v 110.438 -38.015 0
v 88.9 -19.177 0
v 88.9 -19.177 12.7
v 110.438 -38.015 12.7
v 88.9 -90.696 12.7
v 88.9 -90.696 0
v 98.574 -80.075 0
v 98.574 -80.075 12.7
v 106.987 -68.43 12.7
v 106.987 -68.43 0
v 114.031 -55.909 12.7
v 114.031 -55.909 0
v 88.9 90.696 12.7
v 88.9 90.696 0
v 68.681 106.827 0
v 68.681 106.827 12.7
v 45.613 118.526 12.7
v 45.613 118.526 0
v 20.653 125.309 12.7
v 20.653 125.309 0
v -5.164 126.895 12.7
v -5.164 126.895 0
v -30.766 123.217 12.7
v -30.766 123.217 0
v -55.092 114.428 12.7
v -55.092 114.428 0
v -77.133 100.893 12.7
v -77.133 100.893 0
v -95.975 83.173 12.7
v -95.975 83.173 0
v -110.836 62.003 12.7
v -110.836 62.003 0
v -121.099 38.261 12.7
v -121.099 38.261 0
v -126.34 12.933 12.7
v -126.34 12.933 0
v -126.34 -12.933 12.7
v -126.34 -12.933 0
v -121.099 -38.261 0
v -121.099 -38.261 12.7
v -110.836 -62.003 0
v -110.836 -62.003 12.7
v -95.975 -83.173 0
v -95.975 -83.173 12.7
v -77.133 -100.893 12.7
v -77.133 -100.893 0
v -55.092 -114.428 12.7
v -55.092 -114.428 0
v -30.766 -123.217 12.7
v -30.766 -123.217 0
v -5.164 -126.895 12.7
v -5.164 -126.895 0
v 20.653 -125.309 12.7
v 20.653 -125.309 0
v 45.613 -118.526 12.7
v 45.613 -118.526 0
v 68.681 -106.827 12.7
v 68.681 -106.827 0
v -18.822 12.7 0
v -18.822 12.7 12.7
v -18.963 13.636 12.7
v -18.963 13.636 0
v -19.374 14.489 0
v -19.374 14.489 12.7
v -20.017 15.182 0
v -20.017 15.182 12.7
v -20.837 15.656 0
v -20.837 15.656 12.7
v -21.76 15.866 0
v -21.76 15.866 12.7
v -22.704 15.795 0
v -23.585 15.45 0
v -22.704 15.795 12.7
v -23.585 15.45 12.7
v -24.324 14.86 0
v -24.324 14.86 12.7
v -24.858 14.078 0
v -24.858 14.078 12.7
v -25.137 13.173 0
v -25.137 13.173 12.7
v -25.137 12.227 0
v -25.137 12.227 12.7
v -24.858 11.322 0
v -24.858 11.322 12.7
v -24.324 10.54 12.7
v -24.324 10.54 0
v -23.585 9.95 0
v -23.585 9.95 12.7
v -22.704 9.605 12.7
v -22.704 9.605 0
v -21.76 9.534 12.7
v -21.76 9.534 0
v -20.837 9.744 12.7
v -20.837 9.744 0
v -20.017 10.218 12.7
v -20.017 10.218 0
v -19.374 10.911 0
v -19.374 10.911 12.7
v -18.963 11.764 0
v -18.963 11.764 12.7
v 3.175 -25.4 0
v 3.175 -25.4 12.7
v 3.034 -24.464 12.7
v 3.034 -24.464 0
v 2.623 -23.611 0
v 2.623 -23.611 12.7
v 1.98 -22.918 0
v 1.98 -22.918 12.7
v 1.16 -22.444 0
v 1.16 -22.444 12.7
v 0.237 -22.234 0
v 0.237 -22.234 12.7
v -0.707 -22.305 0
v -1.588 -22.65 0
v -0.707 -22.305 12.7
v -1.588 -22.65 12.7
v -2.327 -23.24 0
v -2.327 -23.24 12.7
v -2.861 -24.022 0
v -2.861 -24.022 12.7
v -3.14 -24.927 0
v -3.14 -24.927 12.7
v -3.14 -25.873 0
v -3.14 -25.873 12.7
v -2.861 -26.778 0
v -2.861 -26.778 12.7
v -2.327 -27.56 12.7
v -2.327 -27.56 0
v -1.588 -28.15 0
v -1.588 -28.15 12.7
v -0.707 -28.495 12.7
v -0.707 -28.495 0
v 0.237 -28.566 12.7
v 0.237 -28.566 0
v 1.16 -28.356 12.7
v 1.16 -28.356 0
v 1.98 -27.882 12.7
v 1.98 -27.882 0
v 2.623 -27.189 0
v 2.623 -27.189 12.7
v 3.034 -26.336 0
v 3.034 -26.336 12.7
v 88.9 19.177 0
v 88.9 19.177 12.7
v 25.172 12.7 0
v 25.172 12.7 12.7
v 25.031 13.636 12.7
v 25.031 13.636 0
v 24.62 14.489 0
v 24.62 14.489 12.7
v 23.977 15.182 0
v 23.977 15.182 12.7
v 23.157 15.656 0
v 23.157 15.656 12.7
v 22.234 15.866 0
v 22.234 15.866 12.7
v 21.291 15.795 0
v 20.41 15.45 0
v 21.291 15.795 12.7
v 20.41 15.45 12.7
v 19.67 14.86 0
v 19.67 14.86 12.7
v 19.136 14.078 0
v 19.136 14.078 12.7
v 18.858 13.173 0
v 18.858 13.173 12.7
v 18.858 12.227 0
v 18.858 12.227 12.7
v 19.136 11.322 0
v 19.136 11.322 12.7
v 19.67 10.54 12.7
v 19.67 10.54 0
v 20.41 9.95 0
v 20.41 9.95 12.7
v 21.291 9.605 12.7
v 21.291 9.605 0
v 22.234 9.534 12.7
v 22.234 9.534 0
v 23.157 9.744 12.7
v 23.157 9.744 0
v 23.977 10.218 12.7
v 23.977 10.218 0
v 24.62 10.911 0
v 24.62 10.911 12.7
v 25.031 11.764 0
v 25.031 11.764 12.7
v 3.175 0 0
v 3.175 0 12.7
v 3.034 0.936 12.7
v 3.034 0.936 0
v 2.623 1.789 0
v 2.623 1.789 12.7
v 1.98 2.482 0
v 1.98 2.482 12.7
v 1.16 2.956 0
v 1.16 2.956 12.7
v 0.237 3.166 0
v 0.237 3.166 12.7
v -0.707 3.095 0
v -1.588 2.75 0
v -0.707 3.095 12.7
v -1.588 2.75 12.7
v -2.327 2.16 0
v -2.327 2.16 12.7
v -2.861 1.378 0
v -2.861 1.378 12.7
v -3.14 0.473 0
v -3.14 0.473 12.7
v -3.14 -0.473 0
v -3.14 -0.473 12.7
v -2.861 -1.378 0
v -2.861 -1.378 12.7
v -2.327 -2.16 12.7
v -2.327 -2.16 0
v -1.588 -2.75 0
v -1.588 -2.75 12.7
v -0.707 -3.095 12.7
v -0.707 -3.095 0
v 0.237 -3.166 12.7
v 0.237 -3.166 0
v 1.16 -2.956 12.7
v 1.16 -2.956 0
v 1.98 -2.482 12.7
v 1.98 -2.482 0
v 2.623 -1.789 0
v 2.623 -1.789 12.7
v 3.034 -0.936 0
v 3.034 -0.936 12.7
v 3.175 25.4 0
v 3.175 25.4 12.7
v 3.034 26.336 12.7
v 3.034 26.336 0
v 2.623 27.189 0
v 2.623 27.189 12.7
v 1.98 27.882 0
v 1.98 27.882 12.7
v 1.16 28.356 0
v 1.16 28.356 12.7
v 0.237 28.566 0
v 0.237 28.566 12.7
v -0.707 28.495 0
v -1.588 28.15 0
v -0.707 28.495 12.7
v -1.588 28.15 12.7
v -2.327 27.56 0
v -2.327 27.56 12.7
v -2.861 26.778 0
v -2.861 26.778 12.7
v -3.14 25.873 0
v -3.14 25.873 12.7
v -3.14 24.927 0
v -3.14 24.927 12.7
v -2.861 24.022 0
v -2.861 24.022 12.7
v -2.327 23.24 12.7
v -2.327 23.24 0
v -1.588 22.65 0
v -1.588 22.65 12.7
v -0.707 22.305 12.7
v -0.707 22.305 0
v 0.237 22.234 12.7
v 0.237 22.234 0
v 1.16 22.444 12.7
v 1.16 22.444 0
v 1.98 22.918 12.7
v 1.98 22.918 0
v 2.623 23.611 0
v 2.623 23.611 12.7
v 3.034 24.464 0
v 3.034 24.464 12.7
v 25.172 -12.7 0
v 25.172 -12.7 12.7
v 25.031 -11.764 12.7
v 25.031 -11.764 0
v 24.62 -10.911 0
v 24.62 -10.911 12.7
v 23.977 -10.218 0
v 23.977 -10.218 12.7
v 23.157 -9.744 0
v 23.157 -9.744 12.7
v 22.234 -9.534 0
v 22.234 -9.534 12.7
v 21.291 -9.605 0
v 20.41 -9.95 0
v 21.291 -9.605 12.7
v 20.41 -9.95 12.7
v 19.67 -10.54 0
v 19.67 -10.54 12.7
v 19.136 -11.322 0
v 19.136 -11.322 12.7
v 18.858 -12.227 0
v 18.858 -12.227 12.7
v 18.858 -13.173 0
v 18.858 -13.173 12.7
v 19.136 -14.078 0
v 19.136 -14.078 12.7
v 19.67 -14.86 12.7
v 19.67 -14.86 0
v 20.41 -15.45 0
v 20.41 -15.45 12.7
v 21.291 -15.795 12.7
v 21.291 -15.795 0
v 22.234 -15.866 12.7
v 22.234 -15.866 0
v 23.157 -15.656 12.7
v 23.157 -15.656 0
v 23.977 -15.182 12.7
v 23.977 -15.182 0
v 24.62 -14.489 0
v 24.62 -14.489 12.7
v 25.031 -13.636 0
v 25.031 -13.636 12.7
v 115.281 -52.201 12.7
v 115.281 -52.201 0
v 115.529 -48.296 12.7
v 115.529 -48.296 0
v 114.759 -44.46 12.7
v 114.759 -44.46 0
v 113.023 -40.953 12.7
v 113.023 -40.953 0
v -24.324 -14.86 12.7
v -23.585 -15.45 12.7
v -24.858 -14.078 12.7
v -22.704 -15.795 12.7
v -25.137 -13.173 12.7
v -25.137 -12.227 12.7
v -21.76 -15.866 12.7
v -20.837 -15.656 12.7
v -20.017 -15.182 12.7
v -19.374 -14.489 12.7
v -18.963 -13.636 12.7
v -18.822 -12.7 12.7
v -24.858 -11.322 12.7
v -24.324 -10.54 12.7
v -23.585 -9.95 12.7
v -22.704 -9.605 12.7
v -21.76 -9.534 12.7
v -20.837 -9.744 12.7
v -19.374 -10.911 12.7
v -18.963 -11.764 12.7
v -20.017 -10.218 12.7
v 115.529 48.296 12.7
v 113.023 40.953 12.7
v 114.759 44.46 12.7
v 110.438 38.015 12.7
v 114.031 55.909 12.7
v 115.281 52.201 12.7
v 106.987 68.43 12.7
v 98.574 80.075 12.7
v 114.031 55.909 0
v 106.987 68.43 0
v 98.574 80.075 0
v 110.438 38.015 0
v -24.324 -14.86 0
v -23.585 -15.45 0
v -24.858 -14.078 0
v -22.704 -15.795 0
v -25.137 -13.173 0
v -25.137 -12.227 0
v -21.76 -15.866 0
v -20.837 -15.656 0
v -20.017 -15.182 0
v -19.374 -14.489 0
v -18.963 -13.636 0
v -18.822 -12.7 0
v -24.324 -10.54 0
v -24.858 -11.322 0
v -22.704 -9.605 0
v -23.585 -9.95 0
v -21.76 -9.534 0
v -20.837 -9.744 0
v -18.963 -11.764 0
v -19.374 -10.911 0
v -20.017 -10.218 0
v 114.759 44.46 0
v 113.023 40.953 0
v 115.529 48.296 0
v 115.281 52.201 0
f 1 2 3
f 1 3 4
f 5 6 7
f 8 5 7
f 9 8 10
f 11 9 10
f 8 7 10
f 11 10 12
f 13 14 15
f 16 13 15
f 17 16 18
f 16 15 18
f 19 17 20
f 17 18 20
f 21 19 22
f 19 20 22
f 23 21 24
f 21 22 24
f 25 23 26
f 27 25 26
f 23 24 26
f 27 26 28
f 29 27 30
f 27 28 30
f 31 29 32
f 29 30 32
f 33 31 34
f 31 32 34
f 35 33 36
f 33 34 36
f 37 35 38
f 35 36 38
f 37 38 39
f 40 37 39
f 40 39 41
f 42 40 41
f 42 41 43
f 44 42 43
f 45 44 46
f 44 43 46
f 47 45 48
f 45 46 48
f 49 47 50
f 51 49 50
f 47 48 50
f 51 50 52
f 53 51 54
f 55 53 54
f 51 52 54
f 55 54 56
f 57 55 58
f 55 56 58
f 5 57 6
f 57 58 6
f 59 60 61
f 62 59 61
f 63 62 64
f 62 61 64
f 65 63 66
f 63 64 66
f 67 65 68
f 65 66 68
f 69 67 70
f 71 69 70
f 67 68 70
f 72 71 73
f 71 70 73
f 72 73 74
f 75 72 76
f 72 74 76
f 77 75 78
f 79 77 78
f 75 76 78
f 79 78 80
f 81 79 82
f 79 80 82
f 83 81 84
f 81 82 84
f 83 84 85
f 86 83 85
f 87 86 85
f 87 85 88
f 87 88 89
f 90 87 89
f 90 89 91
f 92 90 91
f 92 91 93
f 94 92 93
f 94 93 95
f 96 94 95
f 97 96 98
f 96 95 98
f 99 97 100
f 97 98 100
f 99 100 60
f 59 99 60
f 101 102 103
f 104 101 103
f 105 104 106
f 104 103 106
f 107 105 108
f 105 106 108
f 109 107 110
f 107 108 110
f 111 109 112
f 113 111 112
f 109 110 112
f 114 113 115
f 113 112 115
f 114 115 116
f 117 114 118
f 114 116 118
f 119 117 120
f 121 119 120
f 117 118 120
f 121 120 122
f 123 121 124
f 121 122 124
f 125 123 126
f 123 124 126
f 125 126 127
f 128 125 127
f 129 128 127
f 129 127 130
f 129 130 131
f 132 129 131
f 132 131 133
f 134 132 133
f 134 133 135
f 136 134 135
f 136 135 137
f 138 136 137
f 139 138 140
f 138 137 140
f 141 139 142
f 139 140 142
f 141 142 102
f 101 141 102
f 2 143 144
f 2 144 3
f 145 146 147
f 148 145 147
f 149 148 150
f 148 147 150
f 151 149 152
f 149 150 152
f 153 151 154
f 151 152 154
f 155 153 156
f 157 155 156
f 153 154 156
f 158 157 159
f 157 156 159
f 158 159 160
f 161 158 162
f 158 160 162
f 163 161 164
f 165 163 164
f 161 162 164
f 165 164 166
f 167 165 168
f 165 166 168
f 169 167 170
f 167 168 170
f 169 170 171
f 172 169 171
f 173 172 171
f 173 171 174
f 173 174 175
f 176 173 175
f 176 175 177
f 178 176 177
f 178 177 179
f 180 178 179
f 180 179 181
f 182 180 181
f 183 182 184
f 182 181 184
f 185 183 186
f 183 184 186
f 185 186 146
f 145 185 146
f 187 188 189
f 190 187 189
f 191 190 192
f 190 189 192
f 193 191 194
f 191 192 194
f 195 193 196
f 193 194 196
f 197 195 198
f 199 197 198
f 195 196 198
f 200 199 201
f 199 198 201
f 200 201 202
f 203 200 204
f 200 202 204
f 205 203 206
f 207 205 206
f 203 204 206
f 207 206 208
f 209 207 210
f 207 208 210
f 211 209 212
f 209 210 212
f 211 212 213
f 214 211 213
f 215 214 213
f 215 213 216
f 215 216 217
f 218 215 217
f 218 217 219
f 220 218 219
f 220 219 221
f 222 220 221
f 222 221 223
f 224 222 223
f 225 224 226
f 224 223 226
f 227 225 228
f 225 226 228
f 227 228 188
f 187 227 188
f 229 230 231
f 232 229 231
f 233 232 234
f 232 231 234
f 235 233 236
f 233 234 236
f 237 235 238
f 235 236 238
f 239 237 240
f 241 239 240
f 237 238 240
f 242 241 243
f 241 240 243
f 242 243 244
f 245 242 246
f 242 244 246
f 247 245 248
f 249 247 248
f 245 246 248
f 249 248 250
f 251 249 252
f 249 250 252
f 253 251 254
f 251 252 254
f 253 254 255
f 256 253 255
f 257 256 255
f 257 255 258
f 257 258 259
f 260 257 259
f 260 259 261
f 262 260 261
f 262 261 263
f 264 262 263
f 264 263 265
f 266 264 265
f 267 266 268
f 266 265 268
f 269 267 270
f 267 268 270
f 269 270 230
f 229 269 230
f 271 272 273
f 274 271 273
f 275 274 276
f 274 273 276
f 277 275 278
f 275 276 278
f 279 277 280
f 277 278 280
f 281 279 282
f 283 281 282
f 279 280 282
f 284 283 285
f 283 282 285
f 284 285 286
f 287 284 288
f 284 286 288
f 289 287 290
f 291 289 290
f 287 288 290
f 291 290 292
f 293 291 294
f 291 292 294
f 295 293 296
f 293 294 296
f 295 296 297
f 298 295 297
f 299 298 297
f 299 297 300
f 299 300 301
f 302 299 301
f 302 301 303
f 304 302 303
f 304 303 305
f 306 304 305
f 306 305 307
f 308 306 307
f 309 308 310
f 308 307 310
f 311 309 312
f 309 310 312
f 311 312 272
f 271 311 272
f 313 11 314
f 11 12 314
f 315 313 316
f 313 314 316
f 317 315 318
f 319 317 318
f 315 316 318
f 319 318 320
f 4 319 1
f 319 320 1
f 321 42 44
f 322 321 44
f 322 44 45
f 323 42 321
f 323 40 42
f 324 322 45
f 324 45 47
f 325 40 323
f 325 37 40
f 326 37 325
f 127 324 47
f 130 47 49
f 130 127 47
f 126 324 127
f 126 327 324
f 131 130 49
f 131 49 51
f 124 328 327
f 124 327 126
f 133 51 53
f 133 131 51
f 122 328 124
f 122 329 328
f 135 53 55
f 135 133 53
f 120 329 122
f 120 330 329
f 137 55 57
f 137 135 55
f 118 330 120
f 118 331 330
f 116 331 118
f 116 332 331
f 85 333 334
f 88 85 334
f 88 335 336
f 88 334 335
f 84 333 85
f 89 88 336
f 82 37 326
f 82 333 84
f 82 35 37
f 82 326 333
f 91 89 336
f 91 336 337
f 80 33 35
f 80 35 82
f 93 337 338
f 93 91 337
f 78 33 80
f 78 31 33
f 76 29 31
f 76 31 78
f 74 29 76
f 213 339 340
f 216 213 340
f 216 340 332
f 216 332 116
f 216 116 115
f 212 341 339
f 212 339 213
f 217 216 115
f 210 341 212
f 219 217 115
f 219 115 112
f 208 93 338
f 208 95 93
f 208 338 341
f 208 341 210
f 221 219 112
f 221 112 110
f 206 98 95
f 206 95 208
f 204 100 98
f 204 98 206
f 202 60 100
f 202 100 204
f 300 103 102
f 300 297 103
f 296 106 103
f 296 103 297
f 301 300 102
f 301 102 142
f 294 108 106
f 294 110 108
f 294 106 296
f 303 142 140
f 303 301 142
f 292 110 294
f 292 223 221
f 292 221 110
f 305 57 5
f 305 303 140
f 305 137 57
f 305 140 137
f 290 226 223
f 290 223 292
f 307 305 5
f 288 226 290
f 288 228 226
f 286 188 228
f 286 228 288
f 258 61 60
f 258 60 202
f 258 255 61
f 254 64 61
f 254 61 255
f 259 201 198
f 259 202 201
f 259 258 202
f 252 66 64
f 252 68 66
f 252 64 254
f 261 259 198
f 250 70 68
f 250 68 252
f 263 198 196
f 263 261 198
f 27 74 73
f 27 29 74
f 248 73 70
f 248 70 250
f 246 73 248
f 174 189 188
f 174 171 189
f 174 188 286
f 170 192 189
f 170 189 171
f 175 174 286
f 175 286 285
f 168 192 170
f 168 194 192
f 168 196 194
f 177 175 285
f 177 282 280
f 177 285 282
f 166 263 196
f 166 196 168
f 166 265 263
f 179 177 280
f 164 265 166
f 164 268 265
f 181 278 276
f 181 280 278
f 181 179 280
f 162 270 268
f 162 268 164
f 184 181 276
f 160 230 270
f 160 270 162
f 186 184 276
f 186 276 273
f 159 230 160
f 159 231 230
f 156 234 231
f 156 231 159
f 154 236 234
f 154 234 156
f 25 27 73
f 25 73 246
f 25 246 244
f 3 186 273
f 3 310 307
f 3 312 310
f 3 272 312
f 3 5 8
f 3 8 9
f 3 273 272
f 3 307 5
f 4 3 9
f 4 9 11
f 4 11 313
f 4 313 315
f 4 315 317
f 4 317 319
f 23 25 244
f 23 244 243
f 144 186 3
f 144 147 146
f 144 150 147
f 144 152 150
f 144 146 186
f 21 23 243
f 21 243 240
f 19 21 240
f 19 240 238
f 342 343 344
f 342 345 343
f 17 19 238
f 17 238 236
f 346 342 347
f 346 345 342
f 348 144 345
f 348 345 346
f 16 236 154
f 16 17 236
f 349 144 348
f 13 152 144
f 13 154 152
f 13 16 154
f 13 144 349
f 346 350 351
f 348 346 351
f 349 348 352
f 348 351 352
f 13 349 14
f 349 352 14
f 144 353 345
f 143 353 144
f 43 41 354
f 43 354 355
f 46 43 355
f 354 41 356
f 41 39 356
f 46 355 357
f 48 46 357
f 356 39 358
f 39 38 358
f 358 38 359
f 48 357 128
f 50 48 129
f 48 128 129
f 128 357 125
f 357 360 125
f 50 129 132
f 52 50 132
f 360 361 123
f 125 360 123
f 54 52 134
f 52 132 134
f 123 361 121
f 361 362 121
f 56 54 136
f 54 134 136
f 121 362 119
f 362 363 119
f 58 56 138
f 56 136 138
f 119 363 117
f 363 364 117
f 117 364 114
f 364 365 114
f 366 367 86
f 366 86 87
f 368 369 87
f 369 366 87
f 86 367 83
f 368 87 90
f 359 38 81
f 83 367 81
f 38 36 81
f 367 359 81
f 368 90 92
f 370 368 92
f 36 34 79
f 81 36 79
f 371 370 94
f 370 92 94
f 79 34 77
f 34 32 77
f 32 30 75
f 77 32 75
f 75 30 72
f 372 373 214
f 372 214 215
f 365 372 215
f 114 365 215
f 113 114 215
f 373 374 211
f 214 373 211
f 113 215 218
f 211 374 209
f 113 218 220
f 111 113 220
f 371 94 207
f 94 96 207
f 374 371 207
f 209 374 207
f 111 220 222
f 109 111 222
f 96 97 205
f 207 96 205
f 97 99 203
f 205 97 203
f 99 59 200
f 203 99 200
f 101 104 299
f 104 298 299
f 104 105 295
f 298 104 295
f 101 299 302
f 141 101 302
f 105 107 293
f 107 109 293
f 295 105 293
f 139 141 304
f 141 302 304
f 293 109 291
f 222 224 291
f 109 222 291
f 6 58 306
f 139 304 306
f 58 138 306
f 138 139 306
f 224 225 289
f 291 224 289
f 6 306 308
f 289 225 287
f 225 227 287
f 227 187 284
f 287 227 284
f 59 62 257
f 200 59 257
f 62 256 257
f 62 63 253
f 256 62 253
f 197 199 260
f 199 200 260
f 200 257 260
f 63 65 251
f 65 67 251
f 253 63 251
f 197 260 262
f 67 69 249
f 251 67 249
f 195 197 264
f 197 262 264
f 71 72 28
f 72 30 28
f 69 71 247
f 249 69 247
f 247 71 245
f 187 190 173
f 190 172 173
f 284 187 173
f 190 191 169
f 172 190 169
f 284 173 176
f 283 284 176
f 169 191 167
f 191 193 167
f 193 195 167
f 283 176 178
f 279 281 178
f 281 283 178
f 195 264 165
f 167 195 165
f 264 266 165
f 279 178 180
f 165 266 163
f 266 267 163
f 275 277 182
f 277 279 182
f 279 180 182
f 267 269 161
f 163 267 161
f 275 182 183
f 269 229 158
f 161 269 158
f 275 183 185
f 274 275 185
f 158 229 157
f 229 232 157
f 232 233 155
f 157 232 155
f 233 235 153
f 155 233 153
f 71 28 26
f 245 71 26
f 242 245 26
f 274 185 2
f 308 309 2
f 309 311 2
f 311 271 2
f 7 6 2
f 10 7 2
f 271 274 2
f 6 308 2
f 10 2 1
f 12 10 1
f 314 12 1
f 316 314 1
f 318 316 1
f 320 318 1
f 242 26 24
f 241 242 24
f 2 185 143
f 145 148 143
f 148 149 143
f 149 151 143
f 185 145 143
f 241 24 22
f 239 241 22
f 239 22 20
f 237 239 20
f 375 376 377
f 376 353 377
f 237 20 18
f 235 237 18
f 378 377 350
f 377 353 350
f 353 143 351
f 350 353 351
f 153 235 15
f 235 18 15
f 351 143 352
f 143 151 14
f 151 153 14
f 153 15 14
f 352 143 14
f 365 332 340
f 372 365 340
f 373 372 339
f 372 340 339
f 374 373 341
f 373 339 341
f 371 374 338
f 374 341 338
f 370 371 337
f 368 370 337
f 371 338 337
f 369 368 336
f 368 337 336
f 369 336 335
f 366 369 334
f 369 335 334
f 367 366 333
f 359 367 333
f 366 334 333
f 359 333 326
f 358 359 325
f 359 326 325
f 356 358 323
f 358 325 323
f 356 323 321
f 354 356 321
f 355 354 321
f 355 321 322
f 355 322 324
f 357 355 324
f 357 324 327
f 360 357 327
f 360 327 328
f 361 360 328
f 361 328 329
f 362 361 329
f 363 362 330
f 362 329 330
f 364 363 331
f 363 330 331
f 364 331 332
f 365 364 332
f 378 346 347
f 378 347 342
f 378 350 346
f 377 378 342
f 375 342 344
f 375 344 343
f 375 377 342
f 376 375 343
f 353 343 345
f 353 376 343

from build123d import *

# Parameters (mm, degrees)
F2_DEPTH = 12.7
F3_DEPTH = 12.7
F4_R     = 15
F5_R     = 3.175
F6_DEPTH = 12.7


with BuildPart() as f2:
    # F0 (on Top) → F2 (new body)
    with BuildSketch(Plane.XY):
        with BuildLine():
            Line((88.9, 0), (88.9, 90.6961410425))
            ThreePointArc((88.9, 90.6961410425), (-127, 0), (88.9, -90.6961410425))
            Line((88.9, -90.6961410425), (88.9, 0))
        make_face()
        with BuildLine():
            Line((88.9, 0), (127, 0))
            ThreePointArc((127, 0), (117.0882146076, 49.1868884968), (88.9, 90.6961410425))
            Line((88.9, 90.6961410425), (88.9, 0))
        make_face()
        with BuildLine():
            ThreePointArc((88.9, -90.6961410425), (117.0882146076, -49.1868884968), (127, 0))
            Line((127, 0), (88.9, 0))
            Line((88.9, 0), (88.9, -90.6961410425))
        make_face()
    extrude(amount=F2_DEPTH)

    # F1 (on Top) → F3 (cut, through all)
    with BuildSketch(Plane.XY):
        Polygon((127, 52.5), (88.9, 19.177), (88.9, -19.177), (127, -52.5), align=None)
    extrude(amount=F3_DEPTH, mode=Mode.SUBTRACT)

    # F4
    f4_edges = [f2.edges().sort_by_distance(p)[0] for p in [
        (118.676596, -45.220189, 6.35),
        (118.676596, 45.220189, 6.35),
    ]]
    fillet(f4_edges, radius=F4_R)

    # F5 (on face) → F6 (cut, through all)
    with BuildSketch(Plane.XY.offset(12.7)):
        Circle(F5_R)
        with Locations((0, 25.4)):
            Circle(F5_R)
        with Locations((-21.9970452561, 12.7)):
            Circle(F5_R)
        with Locations((-21.9970452561, -12.7)):
            Circle(F5_R)
        with Locations((0, -25.4)):
            Circle(F5_R)
        with Locations((21.9970452561, -12.7)):
            Circle(F5_R)
        with Locations((21.9970452561, 12.7)):
            Circle(F5_R)
    extrude(amount=-F6_DEPTH, mode=Mode.SUBTRACT)


solid = f2.part
